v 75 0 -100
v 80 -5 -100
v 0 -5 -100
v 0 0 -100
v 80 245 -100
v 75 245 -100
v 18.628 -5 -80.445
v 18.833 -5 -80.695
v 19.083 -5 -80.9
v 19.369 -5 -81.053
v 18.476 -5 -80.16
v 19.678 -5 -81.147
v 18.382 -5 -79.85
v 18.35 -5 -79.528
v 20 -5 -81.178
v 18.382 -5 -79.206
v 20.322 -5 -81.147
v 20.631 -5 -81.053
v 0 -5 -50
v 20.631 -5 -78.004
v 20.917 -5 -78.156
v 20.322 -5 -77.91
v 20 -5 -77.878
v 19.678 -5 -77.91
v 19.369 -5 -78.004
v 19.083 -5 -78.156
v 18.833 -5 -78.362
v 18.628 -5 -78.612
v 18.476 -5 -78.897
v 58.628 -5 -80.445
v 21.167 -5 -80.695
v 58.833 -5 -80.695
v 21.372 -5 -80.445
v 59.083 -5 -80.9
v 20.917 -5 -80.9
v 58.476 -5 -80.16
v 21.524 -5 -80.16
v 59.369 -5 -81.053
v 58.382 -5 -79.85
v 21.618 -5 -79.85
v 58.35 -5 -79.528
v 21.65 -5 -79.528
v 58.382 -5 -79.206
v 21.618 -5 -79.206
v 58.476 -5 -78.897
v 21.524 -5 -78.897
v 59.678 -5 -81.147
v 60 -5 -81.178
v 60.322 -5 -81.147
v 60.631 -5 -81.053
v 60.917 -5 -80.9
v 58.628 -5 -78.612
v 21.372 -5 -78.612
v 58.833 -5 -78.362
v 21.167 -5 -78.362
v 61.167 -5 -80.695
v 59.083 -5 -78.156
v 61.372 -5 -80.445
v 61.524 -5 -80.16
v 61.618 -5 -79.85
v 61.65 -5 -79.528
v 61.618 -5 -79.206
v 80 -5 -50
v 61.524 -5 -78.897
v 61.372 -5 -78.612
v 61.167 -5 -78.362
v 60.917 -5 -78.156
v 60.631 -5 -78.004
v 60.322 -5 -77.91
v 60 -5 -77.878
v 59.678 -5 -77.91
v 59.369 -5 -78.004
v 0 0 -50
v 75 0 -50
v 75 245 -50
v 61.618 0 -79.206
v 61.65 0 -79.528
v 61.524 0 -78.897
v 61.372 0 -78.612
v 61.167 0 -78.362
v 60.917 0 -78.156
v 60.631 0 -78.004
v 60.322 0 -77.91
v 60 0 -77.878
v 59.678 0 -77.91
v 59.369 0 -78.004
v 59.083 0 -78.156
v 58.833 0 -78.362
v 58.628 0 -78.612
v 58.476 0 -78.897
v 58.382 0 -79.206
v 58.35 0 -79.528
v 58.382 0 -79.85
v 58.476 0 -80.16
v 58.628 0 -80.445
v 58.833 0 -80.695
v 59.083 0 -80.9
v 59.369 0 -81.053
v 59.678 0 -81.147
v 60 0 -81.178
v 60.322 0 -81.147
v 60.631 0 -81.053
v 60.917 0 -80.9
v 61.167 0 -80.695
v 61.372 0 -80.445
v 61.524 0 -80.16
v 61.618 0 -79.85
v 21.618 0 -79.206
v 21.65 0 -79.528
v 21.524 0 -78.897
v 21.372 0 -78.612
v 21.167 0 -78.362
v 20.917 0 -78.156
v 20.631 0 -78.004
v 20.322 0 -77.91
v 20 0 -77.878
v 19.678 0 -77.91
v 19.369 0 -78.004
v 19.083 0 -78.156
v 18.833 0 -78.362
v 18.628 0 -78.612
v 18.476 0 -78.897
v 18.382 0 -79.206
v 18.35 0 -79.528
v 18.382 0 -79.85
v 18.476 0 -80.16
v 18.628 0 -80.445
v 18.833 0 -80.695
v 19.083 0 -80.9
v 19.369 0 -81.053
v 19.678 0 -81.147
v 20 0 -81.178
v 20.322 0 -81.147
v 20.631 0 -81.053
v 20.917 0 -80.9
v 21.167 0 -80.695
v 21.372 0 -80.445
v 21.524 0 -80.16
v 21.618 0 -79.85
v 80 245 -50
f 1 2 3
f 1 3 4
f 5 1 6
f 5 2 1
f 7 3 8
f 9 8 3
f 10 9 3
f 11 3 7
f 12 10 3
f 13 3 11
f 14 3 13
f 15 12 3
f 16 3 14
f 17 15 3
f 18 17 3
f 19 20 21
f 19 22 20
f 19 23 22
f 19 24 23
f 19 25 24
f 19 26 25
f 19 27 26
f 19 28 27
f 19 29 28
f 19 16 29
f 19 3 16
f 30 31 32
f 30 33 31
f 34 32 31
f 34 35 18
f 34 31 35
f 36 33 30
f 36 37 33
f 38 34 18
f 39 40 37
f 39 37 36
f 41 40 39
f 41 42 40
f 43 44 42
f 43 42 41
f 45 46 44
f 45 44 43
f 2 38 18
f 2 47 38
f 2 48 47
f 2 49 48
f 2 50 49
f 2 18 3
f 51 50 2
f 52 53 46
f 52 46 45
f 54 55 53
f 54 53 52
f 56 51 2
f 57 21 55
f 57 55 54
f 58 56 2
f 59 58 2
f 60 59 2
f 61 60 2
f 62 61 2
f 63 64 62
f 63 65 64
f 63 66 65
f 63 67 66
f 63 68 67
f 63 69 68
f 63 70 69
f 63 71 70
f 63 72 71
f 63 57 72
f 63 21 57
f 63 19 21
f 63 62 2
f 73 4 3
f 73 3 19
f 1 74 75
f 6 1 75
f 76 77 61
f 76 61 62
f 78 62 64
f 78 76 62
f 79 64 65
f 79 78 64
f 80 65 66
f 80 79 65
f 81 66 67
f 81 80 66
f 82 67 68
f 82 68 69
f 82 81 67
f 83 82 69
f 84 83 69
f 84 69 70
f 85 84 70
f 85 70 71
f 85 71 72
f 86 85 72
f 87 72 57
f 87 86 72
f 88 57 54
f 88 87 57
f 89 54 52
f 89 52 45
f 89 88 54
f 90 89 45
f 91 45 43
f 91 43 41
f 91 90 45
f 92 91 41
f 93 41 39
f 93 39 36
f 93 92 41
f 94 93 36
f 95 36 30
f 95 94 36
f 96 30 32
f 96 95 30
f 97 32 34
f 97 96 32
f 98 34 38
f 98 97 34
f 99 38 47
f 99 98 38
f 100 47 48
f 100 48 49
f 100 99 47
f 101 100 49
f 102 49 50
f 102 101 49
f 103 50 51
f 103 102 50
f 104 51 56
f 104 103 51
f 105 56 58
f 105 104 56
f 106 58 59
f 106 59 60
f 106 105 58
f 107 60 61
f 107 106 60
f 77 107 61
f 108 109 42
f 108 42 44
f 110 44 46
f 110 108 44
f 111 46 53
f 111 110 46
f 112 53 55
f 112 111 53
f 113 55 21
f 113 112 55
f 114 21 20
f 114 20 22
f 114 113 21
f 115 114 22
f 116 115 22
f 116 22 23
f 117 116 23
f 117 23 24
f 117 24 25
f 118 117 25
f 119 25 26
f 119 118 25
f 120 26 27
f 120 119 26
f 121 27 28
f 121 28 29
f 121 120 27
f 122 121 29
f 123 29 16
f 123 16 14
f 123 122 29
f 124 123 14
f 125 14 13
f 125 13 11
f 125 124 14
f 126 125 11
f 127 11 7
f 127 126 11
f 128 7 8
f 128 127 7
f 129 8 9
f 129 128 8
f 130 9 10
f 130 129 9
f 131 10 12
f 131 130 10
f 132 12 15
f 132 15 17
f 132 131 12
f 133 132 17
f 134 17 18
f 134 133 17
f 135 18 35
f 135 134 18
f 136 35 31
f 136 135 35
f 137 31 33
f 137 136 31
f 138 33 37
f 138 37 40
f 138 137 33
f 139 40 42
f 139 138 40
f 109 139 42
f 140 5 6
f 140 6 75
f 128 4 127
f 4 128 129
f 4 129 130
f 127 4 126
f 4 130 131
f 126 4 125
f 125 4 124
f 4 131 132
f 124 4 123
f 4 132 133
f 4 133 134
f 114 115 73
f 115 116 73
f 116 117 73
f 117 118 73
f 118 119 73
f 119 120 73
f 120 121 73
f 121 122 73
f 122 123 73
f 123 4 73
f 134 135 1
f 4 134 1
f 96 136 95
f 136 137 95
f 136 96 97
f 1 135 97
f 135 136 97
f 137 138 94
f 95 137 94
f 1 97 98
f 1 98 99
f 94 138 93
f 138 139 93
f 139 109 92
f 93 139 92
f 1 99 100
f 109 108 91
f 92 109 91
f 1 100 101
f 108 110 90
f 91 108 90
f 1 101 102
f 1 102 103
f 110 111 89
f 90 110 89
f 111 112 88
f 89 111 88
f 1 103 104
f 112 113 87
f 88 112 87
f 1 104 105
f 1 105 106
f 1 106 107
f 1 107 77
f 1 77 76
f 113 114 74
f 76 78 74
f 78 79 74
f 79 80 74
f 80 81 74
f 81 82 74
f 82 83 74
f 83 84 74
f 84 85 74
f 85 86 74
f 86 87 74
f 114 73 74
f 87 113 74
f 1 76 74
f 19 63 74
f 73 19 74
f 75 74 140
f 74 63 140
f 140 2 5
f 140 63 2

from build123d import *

# Parameters (mm, degrees)
F0_W     = 80
F0_H     = 50
F0_R     = 1.65
F1_DEPTH = 5
F2_W     = 245
F2_H     = 50
F3_DEPTH = 5


with BuildPart() as f1:
    # F0 (on Front) → F1 (new body)
    with BuildSketch(Plane.XZ):
        with Locations((40, -75)):
            Rectangle(F0_W, F0_H)
        with Locations((20, -79.52825)):
            Circle(F0_R, mode=Mode.SUBTRACT)
        with Locations((60, -79.52825)):
            Circle(F0_R, mode=Mode.SUBTRACT)
    extrude(amount=F1_DEPTH)

    # F2 (on face) → F3 (join)
    with BuildSketch(Plane.YZ.offset(80)):
        with Locations((122.5, -75)):
            Rectangle(F2_W, F2_H)
    extrude(amount=-F3_DEPTH)


solid = f1.part
